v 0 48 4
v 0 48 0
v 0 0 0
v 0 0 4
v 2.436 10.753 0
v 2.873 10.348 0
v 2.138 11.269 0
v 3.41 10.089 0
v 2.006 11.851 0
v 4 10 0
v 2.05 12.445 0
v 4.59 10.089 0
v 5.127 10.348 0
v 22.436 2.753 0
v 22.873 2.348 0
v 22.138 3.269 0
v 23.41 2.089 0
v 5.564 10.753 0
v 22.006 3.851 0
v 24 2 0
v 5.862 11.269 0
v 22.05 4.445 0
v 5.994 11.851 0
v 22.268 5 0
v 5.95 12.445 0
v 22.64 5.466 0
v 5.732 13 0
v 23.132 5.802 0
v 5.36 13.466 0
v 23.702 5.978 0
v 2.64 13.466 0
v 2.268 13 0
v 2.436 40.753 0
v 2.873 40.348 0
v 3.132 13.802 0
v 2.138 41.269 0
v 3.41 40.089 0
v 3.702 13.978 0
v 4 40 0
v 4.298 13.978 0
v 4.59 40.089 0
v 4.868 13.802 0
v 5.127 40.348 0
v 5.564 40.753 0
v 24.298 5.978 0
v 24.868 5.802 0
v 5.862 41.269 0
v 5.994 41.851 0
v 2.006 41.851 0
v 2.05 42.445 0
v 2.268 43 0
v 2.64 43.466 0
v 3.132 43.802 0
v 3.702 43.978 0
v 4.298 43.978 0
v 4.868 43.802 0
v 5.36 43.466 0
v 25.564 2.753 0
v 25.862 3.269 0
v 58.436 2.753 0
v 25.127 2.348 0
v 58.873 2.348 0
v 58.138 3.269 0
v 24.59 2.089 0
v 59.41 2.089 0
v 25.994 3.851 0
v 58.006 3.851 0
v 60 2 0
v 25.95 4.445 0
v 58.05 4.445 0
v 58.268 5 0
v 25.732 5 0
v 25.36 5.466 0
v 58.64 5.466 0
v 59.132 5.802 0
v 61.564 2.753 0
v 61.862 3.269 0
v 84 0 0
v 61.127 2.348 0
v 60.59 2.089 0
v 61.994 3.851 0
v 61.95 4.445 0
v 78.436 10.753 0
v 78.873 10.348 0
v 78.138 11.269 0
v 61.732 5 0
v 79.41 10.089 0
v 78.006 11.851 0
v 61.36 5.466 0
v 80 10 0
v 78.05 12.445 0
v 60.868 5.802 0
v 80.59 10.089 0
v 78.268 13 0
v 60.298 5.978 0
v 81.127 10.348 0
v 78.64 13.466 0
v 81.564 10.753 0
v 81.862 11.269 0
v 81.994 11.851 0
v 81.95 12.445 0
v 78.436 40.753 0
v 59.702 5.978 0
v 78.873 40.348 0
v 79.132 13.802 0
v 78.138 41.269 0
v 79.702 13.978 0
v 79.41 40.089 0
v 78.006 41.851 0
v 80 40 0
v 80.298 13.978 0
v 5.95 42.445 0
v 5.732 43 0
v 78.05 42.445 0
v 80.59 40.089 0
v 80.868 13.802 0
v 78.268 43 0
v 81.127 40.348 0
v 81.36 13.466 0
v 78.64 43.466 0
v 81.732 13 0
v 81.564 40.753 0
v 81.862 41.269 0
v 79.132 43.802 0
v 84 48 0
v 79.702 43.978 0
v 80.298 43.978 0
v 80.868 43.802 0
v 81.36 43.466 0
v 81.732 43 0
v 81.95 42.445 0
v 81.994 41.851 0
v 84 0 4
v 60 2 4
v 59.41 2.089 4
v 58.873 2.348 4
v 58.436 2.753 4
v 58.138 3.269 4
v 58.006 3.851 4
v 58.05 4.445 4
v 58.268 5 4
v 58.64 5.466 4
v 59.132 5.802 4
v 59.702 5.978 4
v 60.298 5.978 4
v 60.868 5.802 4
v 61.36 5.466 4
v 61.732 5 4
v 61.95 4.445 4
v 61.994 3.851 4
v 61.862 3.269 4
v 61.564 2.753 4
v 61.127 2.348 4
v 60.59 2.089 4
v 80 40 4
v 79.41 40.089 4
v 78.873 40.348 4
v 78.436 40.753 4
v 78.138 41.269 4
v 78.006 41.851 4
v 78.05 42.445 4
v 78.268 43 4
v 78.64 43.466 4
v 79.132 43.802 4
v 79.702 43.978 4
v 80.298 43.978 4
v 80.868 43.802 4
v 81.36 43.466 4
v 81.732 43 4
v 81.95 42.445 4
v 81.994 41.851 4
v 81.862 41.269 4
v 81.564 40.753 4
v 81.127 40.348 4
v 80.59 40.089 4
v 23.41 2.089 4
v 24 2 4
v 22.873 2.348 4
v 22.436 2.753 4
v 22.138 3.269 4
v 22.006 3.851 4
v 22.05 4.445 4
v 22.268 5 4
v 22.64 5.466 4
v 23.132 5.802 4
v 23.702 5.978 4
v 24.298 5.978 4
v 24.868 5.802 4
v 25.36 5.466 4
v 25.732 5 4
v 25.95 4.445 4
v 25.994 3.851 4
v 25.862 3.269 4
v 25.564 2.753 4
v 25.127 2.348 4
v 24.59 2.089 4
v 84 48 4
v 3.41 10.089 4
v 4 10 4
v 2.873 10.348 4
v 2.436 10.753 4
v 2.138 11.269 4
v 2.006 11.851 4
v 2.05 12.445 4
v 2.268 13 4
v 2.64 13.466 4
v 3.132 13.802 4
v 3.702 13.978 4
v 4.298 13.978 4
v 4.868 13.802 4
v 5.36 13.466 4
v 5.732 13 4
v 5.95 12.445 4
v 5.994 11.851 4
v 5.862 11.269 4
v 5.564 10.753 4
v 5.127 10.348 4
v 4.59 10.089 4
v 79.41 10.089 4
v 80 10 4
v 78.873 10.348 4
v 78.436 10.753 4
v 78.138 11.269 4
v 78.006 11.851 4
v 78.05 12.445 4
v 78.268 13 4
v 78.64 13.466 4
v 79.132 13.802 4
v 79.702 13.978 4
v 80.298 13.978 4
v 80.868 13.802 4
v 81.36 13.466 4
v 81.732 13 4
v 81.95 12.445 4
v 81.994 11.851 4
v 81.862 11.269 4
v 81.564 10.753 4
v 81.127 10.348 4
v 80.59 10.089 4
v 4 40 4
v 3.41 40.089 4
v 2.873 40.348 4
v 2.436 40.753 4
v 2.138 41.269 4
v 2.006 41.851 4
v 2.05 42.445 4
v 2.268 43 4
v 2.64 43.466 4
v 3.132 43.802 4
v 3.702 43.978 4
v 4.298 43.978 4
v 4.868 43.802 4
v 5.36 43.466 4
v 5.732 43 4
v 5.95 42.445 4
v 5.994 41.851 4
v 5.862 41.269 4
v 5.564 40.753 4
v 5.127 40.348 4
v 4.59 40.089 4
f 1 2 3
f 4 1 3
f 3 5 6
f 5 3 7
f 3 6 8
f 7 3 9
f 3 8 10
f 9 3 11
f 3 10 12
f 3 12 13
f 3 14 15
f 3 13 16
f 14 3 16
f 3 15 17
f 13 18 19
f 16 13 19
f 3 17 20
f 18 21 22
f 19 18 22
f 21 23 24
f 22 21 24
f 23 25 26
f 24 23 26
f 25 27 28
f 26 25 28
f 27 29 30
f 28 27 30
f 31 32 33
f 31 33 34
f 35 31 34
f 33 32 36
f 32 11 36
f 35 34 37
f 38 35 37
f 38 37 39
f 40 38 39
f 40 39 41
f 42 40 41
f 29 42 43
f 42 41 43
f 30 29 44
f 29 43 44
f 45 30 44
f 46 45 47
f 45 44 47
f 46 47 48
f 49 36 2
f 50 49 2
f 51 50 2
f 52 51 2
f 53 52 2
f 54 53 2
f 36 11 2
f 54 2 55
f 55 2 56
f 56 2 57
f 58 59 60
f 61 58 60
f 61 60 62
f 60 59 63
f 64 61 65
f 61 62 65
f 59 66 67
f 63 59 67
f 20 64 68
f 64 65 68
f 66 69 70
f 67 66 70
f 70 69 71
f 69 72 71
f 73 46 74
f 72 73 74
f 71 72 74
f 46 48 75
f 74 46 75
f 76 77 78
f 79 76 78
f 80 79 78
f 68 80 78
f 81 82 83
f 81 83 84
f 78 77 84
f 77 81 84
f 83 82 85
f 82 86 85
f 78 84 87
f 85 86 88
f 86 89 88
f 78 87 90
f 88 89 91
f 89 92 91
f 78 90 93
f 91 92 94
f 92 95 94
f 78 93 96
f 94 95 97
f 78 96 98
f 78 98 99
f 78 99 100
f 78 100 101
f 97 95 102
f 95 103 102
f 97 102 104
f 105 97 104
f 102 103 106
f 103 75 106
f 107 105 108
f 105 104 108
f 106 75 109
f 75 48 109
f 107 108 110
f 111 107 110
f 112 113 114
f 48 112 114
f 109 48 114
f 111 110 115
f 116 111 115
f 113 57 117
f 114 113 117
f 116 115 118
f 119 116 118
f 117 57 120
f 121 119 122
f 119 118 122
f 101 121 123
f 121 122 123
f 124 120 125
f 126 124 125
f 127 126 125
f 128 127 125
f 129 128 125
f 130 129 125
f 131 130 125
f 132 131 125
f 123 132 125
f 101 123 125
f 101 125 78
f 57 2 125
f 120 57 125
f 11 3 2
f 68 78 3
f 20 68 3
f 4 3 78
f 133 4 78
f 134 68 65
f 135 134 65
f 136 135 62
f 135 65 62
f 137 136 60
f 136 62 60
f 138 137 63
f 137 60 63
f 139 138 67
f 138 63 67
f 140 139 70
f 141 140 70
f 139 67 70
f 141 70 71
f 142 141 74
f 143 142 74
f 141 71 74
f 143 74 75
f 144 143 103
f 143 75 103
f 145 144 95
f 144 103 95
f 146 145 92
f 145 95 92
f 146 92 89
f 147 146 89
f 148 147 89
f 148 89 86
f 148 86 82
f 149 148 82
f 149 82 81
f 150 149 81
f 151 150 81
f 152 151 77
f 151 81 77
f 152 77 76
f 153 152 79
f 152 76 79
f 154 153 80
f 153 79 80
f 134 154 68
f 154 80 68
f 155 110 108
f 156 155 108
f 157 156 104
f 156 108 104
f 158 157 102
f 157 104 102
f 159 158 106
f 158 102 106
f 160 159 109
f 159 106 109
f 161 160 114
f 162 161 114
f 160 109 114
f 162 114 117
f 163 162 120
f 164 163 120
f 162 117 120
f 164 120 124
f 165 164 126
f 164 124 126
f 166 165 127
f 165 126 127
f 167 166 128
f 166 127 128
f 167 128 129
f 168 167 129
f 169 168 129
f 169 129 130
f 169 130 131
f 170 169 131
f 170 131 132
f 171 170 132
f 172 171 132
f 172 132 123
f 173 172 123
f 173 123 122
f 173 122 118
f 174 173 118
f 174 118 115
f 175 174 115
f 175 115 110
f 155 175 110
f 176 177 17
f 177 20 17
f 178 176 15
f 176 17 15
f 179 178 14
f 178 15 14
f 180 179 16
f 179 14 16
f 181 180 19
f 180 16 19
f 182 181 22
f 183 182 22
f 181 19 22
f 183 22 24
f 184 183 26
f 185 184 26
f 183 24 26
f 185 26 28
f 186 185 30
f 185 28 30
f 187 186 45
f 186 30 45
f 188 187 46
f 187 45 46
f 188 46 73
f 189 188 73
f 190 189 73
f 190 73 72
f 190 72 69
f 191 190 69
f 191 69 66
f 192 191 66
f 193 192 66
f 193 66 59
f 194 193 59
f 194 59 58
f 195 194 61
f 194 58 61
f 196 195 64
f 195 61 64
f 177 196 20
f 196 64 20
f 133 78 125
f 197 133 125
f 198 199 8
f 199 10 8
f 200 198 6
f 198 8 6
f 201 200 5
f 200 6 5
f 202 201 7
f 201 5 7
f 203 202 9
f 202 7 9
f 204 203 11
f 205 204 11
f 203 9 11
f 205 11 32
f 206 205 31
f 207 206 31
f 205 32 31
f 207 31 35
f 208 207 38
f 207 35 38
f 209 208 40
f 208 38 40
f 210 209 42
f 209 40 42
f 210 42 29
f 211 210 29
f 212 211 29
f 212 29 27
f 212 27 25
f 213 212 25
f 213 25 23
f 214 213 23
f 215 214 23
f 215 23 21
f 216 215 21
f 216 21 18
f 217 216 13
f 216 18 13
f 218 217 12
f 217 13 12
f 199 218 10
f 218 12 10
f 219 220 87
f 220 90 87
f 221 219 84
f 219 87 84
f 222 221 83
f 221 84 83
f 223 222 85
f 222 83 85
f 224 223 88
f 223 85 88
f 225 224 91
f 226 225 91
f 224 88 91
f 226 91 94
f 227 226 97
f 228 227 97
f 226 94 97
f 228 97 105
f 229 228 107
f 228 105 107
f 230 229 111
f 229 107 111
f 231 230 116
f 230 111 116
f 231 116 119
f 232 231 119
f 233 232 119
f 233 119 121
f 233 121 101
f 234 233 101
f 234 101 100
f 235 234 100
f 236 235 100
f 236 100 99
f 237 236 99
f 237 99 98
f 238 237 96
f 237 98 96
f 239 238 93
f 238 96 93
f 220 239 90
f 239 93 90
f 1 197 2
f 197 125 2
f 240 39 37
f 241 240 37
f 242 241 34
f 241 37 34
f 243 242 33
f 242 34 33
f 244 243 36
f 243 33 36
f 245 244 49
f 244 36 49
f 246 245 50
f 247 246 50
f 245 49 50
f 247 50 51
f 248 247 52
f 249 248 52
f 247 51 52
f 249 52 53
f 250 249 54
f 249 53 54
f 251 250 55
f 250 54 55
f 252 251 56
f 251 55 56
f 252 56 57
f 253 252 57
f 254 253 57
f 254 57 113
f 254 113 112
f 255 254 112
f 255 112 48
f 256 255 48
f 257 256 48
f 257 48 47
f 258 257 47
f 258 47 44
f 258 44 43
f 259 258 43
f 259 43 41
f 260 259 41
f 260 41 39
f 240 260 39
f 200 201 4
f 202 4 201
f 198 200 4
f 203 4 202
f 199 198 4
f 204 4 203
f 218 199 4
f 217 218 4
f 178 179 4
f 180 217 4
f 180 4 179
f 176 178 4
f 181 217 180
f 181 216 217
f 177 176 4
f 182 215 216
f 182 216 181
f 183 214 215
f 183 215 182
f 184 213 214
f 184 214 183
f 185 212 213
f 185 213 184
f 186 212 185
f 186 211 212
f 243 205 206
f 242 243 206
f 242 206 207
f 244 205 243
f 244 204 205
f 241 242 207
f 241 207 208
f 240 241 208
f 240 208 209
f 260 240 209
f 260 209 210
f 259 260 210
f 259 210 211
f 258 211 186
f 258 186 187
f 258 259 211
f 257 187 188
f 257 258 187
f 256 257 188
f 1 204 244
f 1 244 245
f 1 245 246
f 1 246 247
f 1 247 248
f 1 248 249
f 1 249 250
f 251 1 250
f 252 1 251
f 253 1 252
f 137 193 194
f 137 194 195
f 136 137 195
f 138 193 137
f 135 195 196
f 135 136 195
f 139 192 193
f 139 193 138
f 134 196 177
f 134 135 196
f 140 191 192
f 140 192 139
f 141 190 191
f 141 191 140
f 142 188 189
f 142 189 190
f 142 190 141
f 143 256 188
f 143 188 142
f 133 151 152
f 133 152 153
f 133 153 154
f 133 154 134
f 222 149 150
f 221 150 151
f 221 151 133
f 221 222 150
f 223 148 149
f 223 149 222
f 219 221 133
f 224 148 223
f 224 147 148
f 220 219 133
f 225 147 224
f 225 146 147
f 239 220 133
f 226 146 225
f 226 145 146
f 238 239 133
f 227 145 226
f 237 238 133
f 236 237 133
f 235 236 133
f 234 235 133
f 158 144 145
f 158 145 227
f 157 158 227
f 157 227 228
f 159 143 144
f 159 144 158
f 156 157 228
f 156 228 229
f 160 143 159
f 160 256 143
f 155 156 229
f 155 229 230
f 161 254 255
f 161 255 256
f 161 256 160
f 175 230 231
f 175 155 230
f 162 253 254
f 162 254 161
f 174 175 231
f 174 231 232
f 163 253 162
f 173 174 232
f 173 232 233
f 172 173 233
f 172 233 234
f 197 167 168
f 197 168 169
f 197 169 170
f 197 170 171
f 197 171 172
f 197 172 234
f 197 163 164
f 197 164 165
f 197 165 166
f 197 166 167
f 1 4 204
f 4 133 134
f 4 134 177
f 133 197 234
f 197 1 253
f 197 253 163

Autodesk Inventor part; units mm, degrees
ref_plane "YZ Plane" through (0, 0, 0) normal (1, 0, 0) x (0, 1, 0)
ref_plane "XZ Plane" through (0, 0, 0) normal (0, 1, 0) x (-1, 0, 0)
ref_plane "XY Plane" through (0, 0, 0) normal (0, 0, 1) x (1, 0, 0)
sketch "Skizze1" plane through (0, 0, 0) normal (0, 0, 1) x (1, 0, 0)
  line L0 (0, 0) -> (84, 0)
  line L1 (84, 0) -> (84, 48)
  line L2 (84, 48) -> (0, 48)
  line L3 (0, 48) -> (0, 0)
  dimension "d0" = 48
  dimension "d1" = 84
extrude "Extrusion1" add sketch "Skizze1" along normal blind 4
sketch "Skizze2" plane through (0, 0, 4) normal (0, 0, 1) x (1, 0, 0)
  line L0 (0, 48) -> (0, 0) projected
  line L1 (0, 0) -> (84, 0) projected
  line L2 (84, 0) -> (84, 48) projected
  point P0 (4, 12)
  point P1 (4, 42)
  point P2 (80, 42)
  point P3 (80, 12)
  dimension "d4" = 4
  dimension "d5" = 30
  dimension "d6" = 12
  dimension "d7" = 4
hole "Bohrung1" at (4, 12, 4) at (4, 42, 4) at (80, 42, 4) at (80, 12, 4) direction (0, 0, -1) diameter 4 depth 4
sketch "Skizze3" plane through (0, 0, 4) normal (0, 0, 1) x (1, 0, 0)
  line L0 (0, 0) -> (84, 0) projected
  line L1 (0, 48) -> (0, 0) projected
  point P0 (24, 4)
  point P1 (60, 4)
  dimension "d15" = 4
  dimension "d16" = 24
  dimension "d17" = 36
hole "Bohrung2" at (24, 4, 4) at (60, 4, 4) direction (0, 0, -1) diameter 4 depth 4
equation "\"d7\" = d4"
properties part number "1012"
